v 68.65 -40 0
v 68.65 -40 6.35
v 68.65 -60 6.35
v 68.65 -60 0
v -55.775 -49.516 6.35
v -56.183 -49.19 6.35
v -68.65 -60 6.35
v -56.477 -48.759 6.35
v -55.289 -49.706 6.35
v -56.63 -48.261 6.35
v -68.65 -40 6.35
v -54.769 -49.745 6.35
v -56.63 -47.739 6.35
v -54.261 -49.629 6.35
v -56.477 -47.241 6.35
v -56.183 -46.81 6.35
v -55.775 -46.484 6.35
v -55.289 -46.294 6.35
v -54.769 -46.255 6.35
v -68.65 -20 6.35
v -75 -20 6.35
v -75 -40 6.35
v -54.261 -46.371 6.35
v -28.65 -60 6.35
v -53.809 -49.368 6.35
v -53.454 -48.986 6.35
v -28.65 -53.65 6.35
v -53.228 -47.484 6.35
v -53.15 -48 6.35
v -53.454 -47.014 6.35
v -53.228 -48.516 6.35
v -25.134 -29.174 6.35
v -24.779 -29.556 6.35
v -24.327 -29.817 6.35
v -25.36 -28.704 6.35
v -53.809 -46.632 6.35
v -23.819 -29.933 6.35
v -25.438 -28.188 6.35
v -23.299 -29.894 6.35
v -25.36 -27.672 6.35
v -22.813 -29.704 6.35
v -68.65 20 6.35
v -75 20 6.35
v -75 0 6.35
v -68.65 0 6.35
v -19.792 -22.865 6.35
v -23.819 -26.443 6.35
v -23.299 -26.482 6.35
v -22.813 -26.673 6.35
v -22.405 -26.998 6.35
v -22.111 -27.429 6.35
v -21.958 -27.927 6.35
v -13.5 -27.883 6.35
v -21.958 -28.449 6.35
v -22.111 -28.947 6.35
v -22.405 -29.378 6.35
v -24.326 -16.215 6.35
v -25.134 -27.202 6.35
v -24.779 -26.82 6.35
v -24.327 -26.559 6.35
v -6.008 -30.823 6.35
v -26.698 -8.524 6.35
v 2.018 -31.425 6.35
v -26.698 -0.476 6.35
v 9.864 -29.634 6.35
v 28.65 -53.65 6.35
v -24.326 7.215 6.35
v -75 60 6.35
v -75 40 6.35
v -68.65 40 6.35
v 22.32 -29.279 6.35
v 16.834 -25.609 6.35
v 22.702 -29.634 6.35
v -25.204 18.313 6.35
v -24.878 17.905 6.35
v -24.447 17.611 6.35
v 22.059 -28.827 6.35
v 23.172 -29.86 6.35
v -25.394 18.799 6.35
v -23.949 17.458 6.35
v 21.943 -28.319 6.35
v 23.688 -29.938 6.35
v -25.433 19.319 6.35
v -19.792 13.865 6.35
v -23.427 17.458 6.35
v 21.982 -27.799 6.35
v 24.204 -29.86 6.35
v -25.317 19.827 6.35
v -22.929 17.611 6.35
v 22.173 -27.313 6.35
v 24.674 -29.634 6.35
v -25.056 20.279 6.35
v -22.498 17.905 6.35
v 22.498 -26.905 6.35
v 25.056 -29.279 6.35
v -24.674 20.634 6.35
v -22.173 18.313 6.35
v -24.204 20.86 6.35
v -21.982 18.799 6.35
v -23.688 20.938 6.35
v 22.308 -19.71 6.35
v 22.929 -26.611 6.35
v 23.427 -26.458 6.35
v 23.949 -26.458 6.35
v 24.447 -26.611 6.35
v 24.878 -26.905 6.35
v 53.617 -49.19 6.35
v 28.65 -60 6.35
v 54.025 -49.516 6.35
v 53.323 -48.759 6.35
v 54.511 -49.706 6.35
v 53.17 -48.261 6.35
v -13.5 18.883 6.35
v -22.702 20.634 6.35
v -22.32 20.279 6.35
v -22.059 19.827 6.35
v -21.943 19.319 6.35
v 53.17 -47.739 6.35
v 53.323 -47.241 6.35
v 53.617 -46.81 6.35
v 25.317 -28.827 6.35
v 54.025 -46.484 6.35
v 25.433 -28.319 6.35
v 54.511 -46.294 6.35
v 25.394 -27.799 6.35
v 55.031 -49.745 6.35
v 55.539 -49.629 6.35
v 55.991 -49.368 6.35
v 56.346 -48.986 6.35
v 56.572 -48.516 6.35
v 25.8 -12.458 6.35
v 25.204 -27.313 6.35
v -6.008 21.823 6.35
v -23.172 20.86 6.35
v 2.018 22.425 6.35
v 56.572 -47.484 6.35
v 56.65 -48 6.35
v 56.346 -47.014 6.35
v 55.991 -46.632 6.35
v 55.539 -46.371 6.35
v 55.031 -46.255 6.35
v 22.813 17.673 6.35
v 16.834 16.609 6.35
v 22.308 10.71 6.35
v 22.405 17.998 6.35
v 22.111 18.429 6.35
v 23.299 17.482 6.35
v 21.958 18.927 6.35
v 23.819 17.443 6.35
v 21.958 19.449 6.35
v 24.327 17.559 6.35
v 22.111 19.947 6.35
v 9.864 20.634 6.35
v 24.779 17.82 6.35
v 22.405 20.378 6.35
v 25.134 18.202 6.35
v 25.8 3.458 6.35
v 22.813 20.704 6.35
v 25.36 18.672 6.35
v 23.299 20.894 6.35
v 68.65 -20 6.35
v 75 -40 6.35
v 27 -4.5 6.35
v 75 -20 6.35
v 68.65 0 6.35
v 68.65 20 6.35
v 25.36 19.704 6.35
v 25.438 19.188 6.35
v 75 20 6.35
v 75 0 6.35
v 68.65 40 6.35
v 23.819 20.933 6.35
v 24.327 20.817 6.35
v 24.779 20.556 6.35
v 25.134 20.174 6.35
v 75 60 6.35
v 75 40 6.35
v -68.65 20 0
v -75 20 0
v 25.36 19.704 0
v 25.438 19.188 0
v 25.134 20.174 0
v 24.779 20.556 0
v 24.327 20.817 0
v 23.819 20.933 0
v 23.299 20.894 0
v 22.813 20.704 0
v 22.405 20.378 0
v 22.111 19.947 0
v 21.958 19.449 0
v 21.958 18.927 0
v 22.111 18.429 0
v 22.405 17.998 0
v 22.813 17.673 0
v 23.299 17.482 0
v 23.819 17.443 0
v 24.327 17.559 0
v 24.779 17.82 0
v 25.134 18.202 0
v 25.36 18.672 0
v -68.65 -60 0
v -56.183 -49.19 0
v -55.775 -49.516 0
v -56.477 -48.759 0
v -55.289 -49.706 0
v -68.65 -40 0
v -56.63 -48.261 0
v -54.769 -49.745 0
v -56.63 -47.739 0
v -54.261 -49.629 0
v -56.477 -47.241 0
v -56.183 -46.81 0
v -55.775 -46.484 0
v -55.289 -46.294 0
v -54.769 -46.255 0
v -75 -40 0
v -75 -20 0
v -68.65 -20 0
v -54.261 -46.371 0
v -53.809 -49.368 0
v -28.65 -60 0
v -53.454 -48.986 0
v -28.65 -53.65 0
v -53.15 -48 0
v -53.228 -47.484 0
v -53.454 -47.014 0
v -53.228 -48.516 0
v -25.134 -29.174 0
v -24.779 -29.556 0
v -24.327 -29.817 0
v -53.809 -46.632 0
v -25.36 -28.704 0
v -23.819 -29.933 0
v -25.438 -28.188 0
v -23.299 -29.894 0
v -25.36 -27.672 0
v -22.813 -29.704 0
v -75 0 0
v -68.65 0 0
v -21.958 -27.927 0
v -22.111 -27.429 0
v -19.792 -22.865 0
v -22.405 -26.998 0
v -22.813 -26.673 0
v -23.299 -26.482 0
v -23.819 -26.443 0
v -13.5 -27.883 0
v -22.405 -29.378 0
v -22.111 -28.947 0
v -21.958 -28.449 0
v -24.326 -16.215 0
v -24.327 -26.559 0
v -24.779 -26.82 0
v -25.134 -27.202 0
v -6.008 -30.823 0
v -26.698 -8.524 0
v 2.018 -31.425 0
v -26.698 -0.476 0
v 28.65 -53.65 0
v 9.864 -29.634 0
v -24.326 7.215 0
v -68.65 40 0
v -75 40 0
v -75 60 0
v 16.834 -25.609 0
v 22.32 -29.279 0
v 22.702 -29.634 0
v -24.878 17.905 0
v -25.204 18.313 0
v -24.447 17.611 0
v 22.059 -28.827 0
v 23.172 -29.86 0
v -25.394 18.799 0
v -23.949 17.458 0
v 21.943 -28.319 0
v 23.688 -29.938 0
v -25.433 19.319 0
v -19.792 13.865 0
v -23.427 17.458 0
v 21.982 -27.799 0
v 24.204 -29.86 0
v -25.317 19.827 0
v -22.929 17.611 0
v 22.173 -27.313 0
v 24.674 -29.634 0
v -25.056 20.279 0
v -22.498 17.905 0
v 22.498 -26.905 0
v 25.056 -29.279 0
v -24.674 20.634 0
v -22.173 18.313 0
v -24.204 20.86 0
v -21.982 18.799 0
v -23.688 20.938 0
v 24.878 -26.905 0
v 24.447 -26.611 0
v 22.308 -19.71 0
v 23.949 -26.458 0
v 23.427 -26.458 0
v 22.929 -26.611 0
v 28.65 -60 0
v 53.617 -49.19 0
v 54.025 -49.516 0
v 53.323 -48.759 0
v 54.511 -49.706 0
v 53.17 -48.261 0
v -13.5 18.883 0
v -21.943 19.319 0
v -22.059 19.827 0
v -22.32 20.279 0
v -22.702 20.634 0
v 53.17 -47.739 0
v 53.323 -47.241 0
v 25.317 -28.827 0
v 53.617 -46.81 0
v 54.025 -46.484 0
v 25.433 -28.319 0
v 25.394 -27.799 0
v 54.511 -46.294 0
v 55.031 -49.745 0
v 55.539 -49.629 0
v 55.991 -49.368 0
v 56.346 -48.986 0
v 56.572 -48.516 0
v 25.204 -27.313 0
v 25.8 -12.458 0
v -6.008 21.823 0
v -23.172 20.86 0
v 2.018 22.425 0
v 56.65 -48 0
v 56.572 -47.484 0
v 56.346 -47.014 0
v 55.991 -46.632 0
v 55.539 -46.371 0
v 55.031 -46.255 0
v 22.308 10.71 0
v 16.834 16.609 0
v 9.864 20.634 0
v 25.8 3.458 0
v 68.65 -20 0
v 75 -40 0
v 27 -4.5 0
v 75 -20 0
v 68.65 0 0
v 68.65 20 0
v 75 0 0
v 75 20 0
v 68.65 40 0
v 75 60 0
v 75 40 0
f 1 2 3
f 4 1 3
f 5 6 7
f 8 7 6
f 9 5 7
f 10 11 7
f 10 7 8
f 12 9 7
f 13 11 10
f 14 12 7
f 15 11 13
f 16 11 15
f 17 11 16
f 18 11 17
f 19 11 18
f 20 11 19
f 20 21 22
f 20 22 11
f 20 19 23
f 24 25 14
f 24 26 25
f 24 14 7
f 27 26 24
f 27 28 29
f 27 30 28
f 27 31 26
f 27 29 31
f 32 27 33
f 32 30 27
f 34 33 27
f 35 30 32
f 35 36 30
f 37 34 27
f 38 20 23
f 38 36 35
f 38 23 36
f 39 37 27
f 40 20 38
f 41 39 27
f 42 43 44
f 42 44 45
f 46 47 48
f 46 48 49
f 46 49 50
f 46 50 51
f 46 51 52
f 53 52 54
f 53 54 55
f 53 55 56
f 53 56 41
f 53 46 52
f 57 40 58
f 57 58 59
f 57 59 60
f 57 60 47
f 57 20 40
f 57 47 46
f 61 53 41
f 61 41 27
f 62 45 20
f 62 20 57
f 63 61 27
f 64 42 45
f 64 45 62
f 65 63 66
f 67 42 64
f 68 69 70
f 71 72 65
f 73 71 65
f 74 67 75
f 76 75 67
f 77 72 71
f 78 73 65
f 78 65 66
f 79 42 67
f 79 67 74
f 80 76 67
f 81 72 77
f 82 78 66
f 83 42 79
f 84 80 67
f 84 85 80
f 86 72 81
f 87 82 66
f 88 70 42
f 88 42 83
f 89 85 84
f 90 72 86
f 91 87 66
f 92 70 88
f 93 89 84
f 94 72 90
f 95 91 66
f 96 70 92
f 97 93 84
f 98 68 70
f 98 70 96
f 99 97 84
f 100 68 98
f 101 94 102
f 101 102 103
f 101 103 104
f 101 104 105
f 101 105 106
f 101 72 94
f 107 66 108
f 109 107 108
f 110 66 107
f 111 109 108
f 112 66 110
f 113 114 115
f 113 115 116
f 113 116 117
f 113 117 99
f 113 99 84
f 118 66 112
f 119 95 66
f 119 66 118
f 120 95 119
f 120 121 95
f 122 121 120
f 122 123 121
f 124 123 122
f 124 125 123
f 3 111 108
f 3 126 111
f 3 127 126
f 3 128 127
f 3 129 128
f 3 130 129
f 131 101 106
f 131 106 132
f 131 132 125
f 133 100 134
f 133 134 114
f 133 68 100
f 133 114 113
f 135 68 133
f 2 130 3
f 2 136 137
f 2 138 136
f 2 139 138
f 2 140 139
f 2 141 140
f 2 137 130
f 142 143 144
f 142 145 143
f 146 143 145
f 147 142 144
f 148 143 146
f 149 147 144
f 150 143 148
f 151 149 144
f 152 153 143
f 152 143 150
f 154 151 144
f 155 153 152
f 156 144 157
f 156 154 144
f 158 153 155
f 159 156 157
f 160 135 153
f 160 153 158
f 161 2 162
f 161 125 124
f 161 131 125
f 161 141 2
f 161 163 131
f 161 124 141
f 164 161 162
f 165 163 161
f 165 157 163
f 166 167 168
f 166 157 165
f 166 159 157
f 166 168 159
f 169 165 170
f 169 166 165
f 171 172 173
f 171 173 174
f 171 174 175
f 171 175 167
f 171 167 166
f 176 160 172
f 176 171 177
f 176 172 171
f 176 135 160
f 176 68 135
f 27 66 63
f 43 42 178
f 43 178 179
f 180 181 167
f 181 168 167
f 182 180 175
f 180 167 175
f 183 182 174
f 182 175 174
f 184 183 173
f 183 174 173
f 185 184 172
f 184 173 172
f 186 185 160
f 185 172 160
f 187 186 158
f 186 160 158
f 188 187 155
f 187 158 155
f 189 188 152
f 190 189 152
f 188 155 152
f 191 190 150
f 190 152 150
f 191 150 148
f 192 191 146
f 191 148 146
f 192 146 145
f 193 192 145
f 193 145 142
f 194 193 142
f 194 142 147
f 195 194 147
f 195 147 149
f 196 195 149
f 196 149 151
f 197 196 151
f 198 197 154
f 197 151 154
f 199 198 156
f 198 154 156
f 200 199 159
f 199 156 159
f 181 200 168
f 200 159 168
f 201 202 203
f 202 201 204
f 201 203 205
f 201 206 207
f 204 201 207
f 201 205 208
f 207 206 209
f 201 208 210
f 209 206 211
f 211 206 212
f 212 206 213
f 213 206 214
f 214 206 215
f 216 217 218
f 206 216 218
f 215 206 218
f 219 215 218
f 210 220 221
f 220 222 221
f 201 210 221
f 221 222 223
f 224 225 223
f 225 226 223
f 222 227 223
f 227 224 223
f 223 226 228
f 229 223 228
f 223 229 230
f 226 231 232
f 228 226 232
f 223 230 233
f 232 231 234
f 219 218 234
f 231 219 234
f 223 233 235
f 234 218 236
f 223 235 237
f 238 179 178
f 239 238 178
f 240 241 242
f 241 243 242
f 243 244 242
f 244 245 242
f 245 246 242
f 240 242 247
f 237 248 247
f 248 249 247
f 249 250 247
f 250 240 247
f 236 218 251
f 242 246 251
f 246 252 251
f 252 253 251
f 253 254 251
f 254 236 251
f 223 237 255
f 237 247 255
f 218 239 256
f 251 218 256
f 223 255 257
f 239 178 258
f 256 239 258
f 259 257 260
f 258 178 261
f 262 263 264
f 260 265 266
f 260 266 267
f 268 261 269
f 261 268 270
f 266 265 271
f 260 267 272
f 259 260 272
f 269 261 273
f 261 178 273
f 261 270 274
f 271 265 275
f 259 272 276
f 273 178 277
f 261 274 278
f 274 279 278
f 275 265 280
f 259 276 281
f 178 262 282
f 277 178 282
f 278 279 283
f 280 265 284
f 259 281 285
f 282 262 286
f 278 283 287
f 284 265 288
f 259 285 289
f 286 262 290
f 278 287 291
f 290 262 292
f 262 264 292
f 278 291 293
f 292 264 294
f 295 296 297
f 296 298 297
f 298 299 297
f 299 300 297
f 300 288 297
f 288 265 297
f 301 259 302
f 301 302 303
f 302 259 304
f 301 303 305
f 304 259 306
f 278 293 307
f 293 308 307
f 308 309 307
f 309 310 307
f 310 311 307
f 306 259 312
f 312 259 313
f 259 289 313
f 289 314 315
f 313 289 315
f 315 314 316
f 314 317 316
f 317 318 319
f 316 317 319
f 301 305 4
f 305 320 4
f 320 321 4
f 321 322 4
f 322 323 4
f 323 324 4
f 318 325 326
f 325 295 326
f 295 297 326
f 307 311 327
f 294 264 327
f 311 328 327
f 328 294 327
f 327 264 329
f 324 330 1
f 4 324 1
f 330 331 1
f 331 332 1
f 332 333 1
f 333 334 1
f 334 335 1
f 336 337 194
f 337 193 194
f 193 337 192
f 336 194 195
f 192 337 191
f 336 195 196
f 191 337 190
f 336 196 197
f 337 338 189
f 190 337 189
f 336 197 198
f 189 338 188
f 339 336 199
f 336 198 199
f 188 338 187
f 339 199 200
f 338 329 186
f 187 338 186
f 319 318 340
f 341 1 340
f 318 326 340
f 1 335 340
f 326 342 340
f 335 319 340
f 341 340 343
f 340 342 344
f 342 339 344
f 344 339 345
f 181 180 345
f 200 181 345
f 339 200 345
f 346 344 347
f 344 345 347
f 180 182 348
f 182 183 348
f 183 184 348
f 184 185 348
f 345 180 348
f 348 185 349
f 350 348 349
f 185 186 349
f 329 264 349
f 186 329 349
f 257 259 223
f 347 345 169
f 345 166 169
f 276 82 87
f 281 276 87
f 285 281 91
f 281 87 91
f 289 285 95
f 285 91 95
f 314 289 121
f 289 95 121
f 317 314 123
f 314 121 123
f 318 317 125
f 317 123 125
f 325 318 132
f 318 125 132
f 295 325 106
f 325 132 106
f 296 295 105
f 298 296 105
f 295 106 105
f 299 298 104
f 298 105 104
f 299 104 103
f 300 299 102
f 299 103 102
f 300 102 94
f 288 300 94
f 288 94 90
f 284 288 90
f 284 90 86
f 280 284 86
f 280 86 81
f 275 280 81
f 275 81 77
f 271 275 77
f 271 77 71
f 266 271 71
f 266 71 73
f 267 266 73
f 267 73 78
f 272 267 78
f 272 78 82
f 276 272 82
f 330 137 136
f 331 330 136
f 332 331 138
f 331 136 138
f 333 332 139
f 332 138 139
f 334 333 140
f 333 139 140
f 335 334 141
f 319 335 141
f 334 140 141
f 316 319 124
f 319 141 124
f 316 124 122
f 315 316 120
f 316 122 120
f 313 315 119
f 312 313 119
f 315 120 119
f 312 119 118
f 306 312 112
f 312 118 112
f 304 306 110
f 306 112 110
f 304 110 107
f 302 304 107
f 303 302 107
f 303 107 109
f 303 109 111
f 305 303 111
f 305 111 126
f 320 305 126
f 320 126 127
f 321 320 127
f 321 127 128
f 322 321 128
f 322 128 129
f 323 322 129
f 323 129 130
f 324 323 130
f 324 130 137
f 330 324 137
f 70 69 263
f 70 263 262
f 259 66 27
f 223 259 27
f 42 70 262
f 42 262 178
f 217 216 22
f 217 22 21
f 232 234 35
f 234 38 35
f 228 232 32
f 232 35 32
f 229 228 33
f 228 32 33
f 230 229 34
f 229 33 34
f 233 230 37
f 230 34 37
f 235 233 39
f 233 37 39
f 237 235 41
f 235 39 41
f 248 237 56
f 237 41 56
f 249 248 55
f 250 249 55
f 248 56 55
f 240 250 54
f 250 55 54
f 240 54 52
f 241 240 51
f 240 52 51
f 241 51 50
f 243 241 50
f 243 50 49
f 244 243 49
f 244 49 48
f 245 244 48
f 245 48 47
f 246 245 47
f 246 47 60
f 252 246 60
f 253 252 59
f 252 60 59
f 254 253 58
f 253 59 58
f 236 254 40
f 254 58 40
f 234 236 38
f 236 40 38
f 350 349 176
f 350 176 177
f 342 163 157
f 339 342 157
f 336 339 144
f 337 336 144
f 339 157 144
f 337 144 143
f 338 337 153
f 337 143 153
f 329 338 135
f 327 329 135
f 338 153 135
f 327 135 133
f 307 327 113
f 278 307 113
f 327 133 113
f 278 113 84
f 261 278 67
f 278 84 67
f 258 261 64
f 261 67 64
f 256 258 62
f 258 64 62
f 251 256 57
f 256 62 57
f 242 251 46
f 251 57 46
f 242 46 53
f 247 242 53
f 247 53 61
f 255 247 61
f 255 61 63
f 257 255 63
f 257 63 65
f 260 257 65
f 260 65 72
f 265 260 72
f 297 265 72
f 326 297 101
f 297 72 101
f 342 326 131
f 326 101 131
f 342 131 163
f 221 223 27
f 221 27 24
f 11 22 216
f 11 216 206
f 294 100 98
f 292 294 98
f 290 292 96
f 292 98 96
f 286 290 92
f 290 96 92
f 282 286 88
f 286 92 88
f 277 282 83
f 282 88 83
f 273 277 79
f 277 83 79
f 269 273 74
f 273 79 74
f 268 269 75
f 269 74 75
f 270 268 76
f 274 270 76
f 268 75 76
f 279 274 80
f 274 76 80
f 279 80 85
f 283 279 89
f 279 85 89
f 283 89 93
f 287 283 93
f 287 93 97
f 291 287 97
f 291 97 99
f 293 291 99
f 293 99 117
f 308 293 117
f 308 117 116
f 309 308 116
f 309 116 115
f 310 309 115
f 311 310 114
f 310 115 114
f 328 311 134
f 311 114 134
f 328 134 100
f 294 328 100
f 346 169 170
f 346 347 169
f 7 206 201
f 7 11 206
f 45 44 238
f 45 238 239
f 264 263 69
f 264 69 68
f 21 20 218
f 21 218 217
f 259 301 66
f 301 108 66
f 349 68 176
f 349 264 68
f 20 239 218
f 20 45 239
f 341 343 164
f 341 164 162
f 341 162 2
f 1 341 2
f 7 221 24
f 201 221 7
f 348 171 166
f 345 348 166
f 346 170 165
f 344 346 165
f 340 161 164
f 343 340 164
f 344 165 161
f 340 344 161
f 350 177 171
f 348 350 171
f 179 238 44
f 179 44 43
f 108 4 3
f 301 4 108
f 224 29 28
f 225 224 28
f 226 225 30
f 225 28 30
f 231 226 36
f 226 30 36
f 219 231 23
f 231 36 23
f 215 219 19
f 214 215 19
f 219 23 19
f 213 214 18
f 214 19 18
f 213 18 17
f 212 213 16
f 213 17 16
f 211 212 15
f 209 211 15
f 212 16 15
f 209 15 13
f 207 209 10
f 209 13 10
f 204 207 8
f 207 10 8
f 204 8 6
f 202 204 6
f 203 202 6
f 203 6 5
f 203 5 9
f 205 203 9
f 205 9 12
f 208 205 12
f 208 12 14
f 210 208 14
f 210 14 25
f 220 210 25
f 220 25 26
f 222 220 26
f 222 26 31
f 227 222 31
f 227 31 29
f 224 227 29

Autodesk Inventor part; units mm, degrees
ref_plane "YZ Plane" through (0, 0, 0) normal (1, 0, 0) x (0, 1, 0)
ref_plane "XZ Plane" through (0, 0, 0) normal (0, 1, 0) x (-1, 0, 0)
ref_plane "XY Plane" through (0, 0, 0) normal (0, 0, 1) x (1, 0, 0)
sketch "Sketch1" plane through (0, 0, 0) normal (0, 0, 1) x (1, 0, 0)
  line L0 (-75, 60) -> (75, 60)
  line L1 (75, 60) -> (75, -60)
  line L2 (75, -60) -> (-75, -60)
  line L3 (-75, -60) -> (-75, 60)
  point P0 (0, 0)
  dimension "d0" = 150
  dimension "d1" = 120
  dimension "d2" = 60
  dimension "d3" = 75
extrude "Extrusion1" add sketch "Sketch1" along normal blind 6.35
sketch "Sketch2" plane through (0, 0, 6.35) normal (0, 0, 1) x (1, 0, 0)
  line L0 (-75, 60) -> (-75, -60) projected
  line L1 (-75, 40) -> (-68.65, 40)
  line L2 (-68.65, 40) -> (-68.65, 20)
  line L3 (-68.65, 20) -> (-75, 20)
  line L4 (-75, 20) -> (-75, 40)
  line L5 (-75, 60) -> (-75, -60) projected
  line L6 (-75, 0) -> (-68.65, 0)
  line L7 (-68.65, 0) -> (-68.65, -20)
  line L8 (-68.65, -20) -> (-75, -20)
  line L9 (-75, -20) -> (-75, 0)
  line L10 (-75, -40) -> (-68.65, -40)
  line L11 (-68.65, -40) -> (-68.65, -60)
  line L12 (-68.65, -60) -> (-75, -60)
  line L13 (-75, -60) -> (-75, -40)
  line L14 (75, -60) -> (75, 60) projected
  line L15 (75, 40) -> (68.65, 40)
  line L16 (68.65, 40) -> (68.65, 20)
  line L17 (68.65, 20) -> (75, 20)
  line L18 (75, 20) -> (75, 40)
  line L19 (75, 0) -> (68.65, 0)
  line L20 (68.65, 0) -> (68.65, -20)
  line L21 (68.65, -20) -> (75, -20)
  line L22 (75, -20) -> (75, 0)
  line L23 (75, -40) -> (68.65, -40)
  line L24 (68.65, -40) -> (68.65, -60)
  line L25 (68.65, -60) -> (75, -60)
  line L26 (75, -60) -> (75, -40)
  line L27 (-75, -60) -> (75, -60) projected
  line L28 (-28.65, -60) -> (28.65, -60)
  line L29 (28.65, -60) -> (28.65, -53.65)
  line L30 (28.65, -53.65) -> (-28.65, -53.65)
  line L31 (-28.65, -53.65) -> (-28.65, -60)
  line L32 (75, 60) -> (-75, 60) projected
  line L33 (-28.65, 60) -> (28.65, 60)
  point P0 (0, 0)
  dimension "d6" = 6.35
  dimension "d7" = 20
  dimension "d8" = 20
  dimension "d9" = 20
  dimension "d10" = 20
  dimension "d11" = 20
  dimension "d12" = 20
  dimension "d13" = 20
  dimension "d22" = 57.3
  dimension "d23" = 46.35
  dimension "d24" = 46.35
  dimension "d26" = 6.35
extrude "Extrusion2" cut sketch "Sketch2" against normal through all contours L1 L2 L3 L0 | L6 L7 L8 L0 | L14 L17 L16 L15 | L10 L11 L12 L0 | L14 L21 L20 L19 | L31 L30 L29 L27 | L14 L25 L24 L23
sketch "Sketch3" plane through (0, 0, 6.35) normal (0, 0, 1) x (1, 0, 0)
  circle A0 centre (0, -4.5) radius 27
  line L0 (-75, -60) -> (75, -60) projected
  line L1 (75, 40) -> (75, 60) projected
  point P0 (0, 0)
  dimension "d16" = 55.5
  dimension "d17" = 75
  dimension "d18" = 54
extrude "Extrusion3" cut sketch "Sketch3" against normal through all
sketch "Sketch4" plane through (0, 0, 6.35) normal (0, 0, 1) x (1, 0, 0)
  circle A0 centre (0, -4.5) radius 27 projected
  circle A1 centre (0, -4.5) radius 33.5
  circle A2 centre (23.6881, 19.1881) radius 1.75
  line L0 (0, -4.5) -> (33.5, -4.5)
  line L1 (0, -4.5) -> (23.6881, 19.1881)
  point P0 (0, 0)
  dimension "d27" = 67
  dimension "d28" = 45
  dimension "d29" = 3.5
extrude "Extrusion4" cut sketch "Sketch4" against normal through all contours L1 A1 A2 | A2 A1 L1 | A1 A2
pattern_circular "Circular Pattern1" count 4 over 360 about axis through (0, -4.5, 6.35) along (0, 0, -1) of "Extrusion4"
sketch "Sketch5" plane through (0, 0, 6.35) normal (0, 0, 1) x (1, 0, 0)
  circle A0 centre (-54.9, -48) radius 1.75
  circle A1 centre (54.9, -48) radius 1.75
  line L0 (-68.65, -60) -> (-28.65, -60) projected
  line L1 (-75, -20) -> (-75, -40) projected
  line L2 (75, -40) -> (75, -20) projected
  line L3 (28.65, -60) -> (68.65, -60) projected
  point P0 (0, 0)
  dimension "d35" = 3.5
  dimension "d36" = 12
  dimension "d37" = 20.1
  dimension "d38" = 20.1
  dimension "d39" = 12
extrude "Extrusion5" cut sketch "Sketch5" against normal blind 10
equation "\"d2\" = 0.5 * d1"
equation "\"d3\" = 0.5 * d0"
equation "\"d11\" = d8"
equation "\"d12\" = d9"
equation "\"d13\" = d10"
equation "\"d22\" = d21"
equation "\"d24\" = d23"
equation "\"d26\" = d25"
equation "\"d21\" = 57.3"
equation "\"d25\" = 6.35"
properties part number "2204_Housing Front_V1" material "Wood (Birch)"
